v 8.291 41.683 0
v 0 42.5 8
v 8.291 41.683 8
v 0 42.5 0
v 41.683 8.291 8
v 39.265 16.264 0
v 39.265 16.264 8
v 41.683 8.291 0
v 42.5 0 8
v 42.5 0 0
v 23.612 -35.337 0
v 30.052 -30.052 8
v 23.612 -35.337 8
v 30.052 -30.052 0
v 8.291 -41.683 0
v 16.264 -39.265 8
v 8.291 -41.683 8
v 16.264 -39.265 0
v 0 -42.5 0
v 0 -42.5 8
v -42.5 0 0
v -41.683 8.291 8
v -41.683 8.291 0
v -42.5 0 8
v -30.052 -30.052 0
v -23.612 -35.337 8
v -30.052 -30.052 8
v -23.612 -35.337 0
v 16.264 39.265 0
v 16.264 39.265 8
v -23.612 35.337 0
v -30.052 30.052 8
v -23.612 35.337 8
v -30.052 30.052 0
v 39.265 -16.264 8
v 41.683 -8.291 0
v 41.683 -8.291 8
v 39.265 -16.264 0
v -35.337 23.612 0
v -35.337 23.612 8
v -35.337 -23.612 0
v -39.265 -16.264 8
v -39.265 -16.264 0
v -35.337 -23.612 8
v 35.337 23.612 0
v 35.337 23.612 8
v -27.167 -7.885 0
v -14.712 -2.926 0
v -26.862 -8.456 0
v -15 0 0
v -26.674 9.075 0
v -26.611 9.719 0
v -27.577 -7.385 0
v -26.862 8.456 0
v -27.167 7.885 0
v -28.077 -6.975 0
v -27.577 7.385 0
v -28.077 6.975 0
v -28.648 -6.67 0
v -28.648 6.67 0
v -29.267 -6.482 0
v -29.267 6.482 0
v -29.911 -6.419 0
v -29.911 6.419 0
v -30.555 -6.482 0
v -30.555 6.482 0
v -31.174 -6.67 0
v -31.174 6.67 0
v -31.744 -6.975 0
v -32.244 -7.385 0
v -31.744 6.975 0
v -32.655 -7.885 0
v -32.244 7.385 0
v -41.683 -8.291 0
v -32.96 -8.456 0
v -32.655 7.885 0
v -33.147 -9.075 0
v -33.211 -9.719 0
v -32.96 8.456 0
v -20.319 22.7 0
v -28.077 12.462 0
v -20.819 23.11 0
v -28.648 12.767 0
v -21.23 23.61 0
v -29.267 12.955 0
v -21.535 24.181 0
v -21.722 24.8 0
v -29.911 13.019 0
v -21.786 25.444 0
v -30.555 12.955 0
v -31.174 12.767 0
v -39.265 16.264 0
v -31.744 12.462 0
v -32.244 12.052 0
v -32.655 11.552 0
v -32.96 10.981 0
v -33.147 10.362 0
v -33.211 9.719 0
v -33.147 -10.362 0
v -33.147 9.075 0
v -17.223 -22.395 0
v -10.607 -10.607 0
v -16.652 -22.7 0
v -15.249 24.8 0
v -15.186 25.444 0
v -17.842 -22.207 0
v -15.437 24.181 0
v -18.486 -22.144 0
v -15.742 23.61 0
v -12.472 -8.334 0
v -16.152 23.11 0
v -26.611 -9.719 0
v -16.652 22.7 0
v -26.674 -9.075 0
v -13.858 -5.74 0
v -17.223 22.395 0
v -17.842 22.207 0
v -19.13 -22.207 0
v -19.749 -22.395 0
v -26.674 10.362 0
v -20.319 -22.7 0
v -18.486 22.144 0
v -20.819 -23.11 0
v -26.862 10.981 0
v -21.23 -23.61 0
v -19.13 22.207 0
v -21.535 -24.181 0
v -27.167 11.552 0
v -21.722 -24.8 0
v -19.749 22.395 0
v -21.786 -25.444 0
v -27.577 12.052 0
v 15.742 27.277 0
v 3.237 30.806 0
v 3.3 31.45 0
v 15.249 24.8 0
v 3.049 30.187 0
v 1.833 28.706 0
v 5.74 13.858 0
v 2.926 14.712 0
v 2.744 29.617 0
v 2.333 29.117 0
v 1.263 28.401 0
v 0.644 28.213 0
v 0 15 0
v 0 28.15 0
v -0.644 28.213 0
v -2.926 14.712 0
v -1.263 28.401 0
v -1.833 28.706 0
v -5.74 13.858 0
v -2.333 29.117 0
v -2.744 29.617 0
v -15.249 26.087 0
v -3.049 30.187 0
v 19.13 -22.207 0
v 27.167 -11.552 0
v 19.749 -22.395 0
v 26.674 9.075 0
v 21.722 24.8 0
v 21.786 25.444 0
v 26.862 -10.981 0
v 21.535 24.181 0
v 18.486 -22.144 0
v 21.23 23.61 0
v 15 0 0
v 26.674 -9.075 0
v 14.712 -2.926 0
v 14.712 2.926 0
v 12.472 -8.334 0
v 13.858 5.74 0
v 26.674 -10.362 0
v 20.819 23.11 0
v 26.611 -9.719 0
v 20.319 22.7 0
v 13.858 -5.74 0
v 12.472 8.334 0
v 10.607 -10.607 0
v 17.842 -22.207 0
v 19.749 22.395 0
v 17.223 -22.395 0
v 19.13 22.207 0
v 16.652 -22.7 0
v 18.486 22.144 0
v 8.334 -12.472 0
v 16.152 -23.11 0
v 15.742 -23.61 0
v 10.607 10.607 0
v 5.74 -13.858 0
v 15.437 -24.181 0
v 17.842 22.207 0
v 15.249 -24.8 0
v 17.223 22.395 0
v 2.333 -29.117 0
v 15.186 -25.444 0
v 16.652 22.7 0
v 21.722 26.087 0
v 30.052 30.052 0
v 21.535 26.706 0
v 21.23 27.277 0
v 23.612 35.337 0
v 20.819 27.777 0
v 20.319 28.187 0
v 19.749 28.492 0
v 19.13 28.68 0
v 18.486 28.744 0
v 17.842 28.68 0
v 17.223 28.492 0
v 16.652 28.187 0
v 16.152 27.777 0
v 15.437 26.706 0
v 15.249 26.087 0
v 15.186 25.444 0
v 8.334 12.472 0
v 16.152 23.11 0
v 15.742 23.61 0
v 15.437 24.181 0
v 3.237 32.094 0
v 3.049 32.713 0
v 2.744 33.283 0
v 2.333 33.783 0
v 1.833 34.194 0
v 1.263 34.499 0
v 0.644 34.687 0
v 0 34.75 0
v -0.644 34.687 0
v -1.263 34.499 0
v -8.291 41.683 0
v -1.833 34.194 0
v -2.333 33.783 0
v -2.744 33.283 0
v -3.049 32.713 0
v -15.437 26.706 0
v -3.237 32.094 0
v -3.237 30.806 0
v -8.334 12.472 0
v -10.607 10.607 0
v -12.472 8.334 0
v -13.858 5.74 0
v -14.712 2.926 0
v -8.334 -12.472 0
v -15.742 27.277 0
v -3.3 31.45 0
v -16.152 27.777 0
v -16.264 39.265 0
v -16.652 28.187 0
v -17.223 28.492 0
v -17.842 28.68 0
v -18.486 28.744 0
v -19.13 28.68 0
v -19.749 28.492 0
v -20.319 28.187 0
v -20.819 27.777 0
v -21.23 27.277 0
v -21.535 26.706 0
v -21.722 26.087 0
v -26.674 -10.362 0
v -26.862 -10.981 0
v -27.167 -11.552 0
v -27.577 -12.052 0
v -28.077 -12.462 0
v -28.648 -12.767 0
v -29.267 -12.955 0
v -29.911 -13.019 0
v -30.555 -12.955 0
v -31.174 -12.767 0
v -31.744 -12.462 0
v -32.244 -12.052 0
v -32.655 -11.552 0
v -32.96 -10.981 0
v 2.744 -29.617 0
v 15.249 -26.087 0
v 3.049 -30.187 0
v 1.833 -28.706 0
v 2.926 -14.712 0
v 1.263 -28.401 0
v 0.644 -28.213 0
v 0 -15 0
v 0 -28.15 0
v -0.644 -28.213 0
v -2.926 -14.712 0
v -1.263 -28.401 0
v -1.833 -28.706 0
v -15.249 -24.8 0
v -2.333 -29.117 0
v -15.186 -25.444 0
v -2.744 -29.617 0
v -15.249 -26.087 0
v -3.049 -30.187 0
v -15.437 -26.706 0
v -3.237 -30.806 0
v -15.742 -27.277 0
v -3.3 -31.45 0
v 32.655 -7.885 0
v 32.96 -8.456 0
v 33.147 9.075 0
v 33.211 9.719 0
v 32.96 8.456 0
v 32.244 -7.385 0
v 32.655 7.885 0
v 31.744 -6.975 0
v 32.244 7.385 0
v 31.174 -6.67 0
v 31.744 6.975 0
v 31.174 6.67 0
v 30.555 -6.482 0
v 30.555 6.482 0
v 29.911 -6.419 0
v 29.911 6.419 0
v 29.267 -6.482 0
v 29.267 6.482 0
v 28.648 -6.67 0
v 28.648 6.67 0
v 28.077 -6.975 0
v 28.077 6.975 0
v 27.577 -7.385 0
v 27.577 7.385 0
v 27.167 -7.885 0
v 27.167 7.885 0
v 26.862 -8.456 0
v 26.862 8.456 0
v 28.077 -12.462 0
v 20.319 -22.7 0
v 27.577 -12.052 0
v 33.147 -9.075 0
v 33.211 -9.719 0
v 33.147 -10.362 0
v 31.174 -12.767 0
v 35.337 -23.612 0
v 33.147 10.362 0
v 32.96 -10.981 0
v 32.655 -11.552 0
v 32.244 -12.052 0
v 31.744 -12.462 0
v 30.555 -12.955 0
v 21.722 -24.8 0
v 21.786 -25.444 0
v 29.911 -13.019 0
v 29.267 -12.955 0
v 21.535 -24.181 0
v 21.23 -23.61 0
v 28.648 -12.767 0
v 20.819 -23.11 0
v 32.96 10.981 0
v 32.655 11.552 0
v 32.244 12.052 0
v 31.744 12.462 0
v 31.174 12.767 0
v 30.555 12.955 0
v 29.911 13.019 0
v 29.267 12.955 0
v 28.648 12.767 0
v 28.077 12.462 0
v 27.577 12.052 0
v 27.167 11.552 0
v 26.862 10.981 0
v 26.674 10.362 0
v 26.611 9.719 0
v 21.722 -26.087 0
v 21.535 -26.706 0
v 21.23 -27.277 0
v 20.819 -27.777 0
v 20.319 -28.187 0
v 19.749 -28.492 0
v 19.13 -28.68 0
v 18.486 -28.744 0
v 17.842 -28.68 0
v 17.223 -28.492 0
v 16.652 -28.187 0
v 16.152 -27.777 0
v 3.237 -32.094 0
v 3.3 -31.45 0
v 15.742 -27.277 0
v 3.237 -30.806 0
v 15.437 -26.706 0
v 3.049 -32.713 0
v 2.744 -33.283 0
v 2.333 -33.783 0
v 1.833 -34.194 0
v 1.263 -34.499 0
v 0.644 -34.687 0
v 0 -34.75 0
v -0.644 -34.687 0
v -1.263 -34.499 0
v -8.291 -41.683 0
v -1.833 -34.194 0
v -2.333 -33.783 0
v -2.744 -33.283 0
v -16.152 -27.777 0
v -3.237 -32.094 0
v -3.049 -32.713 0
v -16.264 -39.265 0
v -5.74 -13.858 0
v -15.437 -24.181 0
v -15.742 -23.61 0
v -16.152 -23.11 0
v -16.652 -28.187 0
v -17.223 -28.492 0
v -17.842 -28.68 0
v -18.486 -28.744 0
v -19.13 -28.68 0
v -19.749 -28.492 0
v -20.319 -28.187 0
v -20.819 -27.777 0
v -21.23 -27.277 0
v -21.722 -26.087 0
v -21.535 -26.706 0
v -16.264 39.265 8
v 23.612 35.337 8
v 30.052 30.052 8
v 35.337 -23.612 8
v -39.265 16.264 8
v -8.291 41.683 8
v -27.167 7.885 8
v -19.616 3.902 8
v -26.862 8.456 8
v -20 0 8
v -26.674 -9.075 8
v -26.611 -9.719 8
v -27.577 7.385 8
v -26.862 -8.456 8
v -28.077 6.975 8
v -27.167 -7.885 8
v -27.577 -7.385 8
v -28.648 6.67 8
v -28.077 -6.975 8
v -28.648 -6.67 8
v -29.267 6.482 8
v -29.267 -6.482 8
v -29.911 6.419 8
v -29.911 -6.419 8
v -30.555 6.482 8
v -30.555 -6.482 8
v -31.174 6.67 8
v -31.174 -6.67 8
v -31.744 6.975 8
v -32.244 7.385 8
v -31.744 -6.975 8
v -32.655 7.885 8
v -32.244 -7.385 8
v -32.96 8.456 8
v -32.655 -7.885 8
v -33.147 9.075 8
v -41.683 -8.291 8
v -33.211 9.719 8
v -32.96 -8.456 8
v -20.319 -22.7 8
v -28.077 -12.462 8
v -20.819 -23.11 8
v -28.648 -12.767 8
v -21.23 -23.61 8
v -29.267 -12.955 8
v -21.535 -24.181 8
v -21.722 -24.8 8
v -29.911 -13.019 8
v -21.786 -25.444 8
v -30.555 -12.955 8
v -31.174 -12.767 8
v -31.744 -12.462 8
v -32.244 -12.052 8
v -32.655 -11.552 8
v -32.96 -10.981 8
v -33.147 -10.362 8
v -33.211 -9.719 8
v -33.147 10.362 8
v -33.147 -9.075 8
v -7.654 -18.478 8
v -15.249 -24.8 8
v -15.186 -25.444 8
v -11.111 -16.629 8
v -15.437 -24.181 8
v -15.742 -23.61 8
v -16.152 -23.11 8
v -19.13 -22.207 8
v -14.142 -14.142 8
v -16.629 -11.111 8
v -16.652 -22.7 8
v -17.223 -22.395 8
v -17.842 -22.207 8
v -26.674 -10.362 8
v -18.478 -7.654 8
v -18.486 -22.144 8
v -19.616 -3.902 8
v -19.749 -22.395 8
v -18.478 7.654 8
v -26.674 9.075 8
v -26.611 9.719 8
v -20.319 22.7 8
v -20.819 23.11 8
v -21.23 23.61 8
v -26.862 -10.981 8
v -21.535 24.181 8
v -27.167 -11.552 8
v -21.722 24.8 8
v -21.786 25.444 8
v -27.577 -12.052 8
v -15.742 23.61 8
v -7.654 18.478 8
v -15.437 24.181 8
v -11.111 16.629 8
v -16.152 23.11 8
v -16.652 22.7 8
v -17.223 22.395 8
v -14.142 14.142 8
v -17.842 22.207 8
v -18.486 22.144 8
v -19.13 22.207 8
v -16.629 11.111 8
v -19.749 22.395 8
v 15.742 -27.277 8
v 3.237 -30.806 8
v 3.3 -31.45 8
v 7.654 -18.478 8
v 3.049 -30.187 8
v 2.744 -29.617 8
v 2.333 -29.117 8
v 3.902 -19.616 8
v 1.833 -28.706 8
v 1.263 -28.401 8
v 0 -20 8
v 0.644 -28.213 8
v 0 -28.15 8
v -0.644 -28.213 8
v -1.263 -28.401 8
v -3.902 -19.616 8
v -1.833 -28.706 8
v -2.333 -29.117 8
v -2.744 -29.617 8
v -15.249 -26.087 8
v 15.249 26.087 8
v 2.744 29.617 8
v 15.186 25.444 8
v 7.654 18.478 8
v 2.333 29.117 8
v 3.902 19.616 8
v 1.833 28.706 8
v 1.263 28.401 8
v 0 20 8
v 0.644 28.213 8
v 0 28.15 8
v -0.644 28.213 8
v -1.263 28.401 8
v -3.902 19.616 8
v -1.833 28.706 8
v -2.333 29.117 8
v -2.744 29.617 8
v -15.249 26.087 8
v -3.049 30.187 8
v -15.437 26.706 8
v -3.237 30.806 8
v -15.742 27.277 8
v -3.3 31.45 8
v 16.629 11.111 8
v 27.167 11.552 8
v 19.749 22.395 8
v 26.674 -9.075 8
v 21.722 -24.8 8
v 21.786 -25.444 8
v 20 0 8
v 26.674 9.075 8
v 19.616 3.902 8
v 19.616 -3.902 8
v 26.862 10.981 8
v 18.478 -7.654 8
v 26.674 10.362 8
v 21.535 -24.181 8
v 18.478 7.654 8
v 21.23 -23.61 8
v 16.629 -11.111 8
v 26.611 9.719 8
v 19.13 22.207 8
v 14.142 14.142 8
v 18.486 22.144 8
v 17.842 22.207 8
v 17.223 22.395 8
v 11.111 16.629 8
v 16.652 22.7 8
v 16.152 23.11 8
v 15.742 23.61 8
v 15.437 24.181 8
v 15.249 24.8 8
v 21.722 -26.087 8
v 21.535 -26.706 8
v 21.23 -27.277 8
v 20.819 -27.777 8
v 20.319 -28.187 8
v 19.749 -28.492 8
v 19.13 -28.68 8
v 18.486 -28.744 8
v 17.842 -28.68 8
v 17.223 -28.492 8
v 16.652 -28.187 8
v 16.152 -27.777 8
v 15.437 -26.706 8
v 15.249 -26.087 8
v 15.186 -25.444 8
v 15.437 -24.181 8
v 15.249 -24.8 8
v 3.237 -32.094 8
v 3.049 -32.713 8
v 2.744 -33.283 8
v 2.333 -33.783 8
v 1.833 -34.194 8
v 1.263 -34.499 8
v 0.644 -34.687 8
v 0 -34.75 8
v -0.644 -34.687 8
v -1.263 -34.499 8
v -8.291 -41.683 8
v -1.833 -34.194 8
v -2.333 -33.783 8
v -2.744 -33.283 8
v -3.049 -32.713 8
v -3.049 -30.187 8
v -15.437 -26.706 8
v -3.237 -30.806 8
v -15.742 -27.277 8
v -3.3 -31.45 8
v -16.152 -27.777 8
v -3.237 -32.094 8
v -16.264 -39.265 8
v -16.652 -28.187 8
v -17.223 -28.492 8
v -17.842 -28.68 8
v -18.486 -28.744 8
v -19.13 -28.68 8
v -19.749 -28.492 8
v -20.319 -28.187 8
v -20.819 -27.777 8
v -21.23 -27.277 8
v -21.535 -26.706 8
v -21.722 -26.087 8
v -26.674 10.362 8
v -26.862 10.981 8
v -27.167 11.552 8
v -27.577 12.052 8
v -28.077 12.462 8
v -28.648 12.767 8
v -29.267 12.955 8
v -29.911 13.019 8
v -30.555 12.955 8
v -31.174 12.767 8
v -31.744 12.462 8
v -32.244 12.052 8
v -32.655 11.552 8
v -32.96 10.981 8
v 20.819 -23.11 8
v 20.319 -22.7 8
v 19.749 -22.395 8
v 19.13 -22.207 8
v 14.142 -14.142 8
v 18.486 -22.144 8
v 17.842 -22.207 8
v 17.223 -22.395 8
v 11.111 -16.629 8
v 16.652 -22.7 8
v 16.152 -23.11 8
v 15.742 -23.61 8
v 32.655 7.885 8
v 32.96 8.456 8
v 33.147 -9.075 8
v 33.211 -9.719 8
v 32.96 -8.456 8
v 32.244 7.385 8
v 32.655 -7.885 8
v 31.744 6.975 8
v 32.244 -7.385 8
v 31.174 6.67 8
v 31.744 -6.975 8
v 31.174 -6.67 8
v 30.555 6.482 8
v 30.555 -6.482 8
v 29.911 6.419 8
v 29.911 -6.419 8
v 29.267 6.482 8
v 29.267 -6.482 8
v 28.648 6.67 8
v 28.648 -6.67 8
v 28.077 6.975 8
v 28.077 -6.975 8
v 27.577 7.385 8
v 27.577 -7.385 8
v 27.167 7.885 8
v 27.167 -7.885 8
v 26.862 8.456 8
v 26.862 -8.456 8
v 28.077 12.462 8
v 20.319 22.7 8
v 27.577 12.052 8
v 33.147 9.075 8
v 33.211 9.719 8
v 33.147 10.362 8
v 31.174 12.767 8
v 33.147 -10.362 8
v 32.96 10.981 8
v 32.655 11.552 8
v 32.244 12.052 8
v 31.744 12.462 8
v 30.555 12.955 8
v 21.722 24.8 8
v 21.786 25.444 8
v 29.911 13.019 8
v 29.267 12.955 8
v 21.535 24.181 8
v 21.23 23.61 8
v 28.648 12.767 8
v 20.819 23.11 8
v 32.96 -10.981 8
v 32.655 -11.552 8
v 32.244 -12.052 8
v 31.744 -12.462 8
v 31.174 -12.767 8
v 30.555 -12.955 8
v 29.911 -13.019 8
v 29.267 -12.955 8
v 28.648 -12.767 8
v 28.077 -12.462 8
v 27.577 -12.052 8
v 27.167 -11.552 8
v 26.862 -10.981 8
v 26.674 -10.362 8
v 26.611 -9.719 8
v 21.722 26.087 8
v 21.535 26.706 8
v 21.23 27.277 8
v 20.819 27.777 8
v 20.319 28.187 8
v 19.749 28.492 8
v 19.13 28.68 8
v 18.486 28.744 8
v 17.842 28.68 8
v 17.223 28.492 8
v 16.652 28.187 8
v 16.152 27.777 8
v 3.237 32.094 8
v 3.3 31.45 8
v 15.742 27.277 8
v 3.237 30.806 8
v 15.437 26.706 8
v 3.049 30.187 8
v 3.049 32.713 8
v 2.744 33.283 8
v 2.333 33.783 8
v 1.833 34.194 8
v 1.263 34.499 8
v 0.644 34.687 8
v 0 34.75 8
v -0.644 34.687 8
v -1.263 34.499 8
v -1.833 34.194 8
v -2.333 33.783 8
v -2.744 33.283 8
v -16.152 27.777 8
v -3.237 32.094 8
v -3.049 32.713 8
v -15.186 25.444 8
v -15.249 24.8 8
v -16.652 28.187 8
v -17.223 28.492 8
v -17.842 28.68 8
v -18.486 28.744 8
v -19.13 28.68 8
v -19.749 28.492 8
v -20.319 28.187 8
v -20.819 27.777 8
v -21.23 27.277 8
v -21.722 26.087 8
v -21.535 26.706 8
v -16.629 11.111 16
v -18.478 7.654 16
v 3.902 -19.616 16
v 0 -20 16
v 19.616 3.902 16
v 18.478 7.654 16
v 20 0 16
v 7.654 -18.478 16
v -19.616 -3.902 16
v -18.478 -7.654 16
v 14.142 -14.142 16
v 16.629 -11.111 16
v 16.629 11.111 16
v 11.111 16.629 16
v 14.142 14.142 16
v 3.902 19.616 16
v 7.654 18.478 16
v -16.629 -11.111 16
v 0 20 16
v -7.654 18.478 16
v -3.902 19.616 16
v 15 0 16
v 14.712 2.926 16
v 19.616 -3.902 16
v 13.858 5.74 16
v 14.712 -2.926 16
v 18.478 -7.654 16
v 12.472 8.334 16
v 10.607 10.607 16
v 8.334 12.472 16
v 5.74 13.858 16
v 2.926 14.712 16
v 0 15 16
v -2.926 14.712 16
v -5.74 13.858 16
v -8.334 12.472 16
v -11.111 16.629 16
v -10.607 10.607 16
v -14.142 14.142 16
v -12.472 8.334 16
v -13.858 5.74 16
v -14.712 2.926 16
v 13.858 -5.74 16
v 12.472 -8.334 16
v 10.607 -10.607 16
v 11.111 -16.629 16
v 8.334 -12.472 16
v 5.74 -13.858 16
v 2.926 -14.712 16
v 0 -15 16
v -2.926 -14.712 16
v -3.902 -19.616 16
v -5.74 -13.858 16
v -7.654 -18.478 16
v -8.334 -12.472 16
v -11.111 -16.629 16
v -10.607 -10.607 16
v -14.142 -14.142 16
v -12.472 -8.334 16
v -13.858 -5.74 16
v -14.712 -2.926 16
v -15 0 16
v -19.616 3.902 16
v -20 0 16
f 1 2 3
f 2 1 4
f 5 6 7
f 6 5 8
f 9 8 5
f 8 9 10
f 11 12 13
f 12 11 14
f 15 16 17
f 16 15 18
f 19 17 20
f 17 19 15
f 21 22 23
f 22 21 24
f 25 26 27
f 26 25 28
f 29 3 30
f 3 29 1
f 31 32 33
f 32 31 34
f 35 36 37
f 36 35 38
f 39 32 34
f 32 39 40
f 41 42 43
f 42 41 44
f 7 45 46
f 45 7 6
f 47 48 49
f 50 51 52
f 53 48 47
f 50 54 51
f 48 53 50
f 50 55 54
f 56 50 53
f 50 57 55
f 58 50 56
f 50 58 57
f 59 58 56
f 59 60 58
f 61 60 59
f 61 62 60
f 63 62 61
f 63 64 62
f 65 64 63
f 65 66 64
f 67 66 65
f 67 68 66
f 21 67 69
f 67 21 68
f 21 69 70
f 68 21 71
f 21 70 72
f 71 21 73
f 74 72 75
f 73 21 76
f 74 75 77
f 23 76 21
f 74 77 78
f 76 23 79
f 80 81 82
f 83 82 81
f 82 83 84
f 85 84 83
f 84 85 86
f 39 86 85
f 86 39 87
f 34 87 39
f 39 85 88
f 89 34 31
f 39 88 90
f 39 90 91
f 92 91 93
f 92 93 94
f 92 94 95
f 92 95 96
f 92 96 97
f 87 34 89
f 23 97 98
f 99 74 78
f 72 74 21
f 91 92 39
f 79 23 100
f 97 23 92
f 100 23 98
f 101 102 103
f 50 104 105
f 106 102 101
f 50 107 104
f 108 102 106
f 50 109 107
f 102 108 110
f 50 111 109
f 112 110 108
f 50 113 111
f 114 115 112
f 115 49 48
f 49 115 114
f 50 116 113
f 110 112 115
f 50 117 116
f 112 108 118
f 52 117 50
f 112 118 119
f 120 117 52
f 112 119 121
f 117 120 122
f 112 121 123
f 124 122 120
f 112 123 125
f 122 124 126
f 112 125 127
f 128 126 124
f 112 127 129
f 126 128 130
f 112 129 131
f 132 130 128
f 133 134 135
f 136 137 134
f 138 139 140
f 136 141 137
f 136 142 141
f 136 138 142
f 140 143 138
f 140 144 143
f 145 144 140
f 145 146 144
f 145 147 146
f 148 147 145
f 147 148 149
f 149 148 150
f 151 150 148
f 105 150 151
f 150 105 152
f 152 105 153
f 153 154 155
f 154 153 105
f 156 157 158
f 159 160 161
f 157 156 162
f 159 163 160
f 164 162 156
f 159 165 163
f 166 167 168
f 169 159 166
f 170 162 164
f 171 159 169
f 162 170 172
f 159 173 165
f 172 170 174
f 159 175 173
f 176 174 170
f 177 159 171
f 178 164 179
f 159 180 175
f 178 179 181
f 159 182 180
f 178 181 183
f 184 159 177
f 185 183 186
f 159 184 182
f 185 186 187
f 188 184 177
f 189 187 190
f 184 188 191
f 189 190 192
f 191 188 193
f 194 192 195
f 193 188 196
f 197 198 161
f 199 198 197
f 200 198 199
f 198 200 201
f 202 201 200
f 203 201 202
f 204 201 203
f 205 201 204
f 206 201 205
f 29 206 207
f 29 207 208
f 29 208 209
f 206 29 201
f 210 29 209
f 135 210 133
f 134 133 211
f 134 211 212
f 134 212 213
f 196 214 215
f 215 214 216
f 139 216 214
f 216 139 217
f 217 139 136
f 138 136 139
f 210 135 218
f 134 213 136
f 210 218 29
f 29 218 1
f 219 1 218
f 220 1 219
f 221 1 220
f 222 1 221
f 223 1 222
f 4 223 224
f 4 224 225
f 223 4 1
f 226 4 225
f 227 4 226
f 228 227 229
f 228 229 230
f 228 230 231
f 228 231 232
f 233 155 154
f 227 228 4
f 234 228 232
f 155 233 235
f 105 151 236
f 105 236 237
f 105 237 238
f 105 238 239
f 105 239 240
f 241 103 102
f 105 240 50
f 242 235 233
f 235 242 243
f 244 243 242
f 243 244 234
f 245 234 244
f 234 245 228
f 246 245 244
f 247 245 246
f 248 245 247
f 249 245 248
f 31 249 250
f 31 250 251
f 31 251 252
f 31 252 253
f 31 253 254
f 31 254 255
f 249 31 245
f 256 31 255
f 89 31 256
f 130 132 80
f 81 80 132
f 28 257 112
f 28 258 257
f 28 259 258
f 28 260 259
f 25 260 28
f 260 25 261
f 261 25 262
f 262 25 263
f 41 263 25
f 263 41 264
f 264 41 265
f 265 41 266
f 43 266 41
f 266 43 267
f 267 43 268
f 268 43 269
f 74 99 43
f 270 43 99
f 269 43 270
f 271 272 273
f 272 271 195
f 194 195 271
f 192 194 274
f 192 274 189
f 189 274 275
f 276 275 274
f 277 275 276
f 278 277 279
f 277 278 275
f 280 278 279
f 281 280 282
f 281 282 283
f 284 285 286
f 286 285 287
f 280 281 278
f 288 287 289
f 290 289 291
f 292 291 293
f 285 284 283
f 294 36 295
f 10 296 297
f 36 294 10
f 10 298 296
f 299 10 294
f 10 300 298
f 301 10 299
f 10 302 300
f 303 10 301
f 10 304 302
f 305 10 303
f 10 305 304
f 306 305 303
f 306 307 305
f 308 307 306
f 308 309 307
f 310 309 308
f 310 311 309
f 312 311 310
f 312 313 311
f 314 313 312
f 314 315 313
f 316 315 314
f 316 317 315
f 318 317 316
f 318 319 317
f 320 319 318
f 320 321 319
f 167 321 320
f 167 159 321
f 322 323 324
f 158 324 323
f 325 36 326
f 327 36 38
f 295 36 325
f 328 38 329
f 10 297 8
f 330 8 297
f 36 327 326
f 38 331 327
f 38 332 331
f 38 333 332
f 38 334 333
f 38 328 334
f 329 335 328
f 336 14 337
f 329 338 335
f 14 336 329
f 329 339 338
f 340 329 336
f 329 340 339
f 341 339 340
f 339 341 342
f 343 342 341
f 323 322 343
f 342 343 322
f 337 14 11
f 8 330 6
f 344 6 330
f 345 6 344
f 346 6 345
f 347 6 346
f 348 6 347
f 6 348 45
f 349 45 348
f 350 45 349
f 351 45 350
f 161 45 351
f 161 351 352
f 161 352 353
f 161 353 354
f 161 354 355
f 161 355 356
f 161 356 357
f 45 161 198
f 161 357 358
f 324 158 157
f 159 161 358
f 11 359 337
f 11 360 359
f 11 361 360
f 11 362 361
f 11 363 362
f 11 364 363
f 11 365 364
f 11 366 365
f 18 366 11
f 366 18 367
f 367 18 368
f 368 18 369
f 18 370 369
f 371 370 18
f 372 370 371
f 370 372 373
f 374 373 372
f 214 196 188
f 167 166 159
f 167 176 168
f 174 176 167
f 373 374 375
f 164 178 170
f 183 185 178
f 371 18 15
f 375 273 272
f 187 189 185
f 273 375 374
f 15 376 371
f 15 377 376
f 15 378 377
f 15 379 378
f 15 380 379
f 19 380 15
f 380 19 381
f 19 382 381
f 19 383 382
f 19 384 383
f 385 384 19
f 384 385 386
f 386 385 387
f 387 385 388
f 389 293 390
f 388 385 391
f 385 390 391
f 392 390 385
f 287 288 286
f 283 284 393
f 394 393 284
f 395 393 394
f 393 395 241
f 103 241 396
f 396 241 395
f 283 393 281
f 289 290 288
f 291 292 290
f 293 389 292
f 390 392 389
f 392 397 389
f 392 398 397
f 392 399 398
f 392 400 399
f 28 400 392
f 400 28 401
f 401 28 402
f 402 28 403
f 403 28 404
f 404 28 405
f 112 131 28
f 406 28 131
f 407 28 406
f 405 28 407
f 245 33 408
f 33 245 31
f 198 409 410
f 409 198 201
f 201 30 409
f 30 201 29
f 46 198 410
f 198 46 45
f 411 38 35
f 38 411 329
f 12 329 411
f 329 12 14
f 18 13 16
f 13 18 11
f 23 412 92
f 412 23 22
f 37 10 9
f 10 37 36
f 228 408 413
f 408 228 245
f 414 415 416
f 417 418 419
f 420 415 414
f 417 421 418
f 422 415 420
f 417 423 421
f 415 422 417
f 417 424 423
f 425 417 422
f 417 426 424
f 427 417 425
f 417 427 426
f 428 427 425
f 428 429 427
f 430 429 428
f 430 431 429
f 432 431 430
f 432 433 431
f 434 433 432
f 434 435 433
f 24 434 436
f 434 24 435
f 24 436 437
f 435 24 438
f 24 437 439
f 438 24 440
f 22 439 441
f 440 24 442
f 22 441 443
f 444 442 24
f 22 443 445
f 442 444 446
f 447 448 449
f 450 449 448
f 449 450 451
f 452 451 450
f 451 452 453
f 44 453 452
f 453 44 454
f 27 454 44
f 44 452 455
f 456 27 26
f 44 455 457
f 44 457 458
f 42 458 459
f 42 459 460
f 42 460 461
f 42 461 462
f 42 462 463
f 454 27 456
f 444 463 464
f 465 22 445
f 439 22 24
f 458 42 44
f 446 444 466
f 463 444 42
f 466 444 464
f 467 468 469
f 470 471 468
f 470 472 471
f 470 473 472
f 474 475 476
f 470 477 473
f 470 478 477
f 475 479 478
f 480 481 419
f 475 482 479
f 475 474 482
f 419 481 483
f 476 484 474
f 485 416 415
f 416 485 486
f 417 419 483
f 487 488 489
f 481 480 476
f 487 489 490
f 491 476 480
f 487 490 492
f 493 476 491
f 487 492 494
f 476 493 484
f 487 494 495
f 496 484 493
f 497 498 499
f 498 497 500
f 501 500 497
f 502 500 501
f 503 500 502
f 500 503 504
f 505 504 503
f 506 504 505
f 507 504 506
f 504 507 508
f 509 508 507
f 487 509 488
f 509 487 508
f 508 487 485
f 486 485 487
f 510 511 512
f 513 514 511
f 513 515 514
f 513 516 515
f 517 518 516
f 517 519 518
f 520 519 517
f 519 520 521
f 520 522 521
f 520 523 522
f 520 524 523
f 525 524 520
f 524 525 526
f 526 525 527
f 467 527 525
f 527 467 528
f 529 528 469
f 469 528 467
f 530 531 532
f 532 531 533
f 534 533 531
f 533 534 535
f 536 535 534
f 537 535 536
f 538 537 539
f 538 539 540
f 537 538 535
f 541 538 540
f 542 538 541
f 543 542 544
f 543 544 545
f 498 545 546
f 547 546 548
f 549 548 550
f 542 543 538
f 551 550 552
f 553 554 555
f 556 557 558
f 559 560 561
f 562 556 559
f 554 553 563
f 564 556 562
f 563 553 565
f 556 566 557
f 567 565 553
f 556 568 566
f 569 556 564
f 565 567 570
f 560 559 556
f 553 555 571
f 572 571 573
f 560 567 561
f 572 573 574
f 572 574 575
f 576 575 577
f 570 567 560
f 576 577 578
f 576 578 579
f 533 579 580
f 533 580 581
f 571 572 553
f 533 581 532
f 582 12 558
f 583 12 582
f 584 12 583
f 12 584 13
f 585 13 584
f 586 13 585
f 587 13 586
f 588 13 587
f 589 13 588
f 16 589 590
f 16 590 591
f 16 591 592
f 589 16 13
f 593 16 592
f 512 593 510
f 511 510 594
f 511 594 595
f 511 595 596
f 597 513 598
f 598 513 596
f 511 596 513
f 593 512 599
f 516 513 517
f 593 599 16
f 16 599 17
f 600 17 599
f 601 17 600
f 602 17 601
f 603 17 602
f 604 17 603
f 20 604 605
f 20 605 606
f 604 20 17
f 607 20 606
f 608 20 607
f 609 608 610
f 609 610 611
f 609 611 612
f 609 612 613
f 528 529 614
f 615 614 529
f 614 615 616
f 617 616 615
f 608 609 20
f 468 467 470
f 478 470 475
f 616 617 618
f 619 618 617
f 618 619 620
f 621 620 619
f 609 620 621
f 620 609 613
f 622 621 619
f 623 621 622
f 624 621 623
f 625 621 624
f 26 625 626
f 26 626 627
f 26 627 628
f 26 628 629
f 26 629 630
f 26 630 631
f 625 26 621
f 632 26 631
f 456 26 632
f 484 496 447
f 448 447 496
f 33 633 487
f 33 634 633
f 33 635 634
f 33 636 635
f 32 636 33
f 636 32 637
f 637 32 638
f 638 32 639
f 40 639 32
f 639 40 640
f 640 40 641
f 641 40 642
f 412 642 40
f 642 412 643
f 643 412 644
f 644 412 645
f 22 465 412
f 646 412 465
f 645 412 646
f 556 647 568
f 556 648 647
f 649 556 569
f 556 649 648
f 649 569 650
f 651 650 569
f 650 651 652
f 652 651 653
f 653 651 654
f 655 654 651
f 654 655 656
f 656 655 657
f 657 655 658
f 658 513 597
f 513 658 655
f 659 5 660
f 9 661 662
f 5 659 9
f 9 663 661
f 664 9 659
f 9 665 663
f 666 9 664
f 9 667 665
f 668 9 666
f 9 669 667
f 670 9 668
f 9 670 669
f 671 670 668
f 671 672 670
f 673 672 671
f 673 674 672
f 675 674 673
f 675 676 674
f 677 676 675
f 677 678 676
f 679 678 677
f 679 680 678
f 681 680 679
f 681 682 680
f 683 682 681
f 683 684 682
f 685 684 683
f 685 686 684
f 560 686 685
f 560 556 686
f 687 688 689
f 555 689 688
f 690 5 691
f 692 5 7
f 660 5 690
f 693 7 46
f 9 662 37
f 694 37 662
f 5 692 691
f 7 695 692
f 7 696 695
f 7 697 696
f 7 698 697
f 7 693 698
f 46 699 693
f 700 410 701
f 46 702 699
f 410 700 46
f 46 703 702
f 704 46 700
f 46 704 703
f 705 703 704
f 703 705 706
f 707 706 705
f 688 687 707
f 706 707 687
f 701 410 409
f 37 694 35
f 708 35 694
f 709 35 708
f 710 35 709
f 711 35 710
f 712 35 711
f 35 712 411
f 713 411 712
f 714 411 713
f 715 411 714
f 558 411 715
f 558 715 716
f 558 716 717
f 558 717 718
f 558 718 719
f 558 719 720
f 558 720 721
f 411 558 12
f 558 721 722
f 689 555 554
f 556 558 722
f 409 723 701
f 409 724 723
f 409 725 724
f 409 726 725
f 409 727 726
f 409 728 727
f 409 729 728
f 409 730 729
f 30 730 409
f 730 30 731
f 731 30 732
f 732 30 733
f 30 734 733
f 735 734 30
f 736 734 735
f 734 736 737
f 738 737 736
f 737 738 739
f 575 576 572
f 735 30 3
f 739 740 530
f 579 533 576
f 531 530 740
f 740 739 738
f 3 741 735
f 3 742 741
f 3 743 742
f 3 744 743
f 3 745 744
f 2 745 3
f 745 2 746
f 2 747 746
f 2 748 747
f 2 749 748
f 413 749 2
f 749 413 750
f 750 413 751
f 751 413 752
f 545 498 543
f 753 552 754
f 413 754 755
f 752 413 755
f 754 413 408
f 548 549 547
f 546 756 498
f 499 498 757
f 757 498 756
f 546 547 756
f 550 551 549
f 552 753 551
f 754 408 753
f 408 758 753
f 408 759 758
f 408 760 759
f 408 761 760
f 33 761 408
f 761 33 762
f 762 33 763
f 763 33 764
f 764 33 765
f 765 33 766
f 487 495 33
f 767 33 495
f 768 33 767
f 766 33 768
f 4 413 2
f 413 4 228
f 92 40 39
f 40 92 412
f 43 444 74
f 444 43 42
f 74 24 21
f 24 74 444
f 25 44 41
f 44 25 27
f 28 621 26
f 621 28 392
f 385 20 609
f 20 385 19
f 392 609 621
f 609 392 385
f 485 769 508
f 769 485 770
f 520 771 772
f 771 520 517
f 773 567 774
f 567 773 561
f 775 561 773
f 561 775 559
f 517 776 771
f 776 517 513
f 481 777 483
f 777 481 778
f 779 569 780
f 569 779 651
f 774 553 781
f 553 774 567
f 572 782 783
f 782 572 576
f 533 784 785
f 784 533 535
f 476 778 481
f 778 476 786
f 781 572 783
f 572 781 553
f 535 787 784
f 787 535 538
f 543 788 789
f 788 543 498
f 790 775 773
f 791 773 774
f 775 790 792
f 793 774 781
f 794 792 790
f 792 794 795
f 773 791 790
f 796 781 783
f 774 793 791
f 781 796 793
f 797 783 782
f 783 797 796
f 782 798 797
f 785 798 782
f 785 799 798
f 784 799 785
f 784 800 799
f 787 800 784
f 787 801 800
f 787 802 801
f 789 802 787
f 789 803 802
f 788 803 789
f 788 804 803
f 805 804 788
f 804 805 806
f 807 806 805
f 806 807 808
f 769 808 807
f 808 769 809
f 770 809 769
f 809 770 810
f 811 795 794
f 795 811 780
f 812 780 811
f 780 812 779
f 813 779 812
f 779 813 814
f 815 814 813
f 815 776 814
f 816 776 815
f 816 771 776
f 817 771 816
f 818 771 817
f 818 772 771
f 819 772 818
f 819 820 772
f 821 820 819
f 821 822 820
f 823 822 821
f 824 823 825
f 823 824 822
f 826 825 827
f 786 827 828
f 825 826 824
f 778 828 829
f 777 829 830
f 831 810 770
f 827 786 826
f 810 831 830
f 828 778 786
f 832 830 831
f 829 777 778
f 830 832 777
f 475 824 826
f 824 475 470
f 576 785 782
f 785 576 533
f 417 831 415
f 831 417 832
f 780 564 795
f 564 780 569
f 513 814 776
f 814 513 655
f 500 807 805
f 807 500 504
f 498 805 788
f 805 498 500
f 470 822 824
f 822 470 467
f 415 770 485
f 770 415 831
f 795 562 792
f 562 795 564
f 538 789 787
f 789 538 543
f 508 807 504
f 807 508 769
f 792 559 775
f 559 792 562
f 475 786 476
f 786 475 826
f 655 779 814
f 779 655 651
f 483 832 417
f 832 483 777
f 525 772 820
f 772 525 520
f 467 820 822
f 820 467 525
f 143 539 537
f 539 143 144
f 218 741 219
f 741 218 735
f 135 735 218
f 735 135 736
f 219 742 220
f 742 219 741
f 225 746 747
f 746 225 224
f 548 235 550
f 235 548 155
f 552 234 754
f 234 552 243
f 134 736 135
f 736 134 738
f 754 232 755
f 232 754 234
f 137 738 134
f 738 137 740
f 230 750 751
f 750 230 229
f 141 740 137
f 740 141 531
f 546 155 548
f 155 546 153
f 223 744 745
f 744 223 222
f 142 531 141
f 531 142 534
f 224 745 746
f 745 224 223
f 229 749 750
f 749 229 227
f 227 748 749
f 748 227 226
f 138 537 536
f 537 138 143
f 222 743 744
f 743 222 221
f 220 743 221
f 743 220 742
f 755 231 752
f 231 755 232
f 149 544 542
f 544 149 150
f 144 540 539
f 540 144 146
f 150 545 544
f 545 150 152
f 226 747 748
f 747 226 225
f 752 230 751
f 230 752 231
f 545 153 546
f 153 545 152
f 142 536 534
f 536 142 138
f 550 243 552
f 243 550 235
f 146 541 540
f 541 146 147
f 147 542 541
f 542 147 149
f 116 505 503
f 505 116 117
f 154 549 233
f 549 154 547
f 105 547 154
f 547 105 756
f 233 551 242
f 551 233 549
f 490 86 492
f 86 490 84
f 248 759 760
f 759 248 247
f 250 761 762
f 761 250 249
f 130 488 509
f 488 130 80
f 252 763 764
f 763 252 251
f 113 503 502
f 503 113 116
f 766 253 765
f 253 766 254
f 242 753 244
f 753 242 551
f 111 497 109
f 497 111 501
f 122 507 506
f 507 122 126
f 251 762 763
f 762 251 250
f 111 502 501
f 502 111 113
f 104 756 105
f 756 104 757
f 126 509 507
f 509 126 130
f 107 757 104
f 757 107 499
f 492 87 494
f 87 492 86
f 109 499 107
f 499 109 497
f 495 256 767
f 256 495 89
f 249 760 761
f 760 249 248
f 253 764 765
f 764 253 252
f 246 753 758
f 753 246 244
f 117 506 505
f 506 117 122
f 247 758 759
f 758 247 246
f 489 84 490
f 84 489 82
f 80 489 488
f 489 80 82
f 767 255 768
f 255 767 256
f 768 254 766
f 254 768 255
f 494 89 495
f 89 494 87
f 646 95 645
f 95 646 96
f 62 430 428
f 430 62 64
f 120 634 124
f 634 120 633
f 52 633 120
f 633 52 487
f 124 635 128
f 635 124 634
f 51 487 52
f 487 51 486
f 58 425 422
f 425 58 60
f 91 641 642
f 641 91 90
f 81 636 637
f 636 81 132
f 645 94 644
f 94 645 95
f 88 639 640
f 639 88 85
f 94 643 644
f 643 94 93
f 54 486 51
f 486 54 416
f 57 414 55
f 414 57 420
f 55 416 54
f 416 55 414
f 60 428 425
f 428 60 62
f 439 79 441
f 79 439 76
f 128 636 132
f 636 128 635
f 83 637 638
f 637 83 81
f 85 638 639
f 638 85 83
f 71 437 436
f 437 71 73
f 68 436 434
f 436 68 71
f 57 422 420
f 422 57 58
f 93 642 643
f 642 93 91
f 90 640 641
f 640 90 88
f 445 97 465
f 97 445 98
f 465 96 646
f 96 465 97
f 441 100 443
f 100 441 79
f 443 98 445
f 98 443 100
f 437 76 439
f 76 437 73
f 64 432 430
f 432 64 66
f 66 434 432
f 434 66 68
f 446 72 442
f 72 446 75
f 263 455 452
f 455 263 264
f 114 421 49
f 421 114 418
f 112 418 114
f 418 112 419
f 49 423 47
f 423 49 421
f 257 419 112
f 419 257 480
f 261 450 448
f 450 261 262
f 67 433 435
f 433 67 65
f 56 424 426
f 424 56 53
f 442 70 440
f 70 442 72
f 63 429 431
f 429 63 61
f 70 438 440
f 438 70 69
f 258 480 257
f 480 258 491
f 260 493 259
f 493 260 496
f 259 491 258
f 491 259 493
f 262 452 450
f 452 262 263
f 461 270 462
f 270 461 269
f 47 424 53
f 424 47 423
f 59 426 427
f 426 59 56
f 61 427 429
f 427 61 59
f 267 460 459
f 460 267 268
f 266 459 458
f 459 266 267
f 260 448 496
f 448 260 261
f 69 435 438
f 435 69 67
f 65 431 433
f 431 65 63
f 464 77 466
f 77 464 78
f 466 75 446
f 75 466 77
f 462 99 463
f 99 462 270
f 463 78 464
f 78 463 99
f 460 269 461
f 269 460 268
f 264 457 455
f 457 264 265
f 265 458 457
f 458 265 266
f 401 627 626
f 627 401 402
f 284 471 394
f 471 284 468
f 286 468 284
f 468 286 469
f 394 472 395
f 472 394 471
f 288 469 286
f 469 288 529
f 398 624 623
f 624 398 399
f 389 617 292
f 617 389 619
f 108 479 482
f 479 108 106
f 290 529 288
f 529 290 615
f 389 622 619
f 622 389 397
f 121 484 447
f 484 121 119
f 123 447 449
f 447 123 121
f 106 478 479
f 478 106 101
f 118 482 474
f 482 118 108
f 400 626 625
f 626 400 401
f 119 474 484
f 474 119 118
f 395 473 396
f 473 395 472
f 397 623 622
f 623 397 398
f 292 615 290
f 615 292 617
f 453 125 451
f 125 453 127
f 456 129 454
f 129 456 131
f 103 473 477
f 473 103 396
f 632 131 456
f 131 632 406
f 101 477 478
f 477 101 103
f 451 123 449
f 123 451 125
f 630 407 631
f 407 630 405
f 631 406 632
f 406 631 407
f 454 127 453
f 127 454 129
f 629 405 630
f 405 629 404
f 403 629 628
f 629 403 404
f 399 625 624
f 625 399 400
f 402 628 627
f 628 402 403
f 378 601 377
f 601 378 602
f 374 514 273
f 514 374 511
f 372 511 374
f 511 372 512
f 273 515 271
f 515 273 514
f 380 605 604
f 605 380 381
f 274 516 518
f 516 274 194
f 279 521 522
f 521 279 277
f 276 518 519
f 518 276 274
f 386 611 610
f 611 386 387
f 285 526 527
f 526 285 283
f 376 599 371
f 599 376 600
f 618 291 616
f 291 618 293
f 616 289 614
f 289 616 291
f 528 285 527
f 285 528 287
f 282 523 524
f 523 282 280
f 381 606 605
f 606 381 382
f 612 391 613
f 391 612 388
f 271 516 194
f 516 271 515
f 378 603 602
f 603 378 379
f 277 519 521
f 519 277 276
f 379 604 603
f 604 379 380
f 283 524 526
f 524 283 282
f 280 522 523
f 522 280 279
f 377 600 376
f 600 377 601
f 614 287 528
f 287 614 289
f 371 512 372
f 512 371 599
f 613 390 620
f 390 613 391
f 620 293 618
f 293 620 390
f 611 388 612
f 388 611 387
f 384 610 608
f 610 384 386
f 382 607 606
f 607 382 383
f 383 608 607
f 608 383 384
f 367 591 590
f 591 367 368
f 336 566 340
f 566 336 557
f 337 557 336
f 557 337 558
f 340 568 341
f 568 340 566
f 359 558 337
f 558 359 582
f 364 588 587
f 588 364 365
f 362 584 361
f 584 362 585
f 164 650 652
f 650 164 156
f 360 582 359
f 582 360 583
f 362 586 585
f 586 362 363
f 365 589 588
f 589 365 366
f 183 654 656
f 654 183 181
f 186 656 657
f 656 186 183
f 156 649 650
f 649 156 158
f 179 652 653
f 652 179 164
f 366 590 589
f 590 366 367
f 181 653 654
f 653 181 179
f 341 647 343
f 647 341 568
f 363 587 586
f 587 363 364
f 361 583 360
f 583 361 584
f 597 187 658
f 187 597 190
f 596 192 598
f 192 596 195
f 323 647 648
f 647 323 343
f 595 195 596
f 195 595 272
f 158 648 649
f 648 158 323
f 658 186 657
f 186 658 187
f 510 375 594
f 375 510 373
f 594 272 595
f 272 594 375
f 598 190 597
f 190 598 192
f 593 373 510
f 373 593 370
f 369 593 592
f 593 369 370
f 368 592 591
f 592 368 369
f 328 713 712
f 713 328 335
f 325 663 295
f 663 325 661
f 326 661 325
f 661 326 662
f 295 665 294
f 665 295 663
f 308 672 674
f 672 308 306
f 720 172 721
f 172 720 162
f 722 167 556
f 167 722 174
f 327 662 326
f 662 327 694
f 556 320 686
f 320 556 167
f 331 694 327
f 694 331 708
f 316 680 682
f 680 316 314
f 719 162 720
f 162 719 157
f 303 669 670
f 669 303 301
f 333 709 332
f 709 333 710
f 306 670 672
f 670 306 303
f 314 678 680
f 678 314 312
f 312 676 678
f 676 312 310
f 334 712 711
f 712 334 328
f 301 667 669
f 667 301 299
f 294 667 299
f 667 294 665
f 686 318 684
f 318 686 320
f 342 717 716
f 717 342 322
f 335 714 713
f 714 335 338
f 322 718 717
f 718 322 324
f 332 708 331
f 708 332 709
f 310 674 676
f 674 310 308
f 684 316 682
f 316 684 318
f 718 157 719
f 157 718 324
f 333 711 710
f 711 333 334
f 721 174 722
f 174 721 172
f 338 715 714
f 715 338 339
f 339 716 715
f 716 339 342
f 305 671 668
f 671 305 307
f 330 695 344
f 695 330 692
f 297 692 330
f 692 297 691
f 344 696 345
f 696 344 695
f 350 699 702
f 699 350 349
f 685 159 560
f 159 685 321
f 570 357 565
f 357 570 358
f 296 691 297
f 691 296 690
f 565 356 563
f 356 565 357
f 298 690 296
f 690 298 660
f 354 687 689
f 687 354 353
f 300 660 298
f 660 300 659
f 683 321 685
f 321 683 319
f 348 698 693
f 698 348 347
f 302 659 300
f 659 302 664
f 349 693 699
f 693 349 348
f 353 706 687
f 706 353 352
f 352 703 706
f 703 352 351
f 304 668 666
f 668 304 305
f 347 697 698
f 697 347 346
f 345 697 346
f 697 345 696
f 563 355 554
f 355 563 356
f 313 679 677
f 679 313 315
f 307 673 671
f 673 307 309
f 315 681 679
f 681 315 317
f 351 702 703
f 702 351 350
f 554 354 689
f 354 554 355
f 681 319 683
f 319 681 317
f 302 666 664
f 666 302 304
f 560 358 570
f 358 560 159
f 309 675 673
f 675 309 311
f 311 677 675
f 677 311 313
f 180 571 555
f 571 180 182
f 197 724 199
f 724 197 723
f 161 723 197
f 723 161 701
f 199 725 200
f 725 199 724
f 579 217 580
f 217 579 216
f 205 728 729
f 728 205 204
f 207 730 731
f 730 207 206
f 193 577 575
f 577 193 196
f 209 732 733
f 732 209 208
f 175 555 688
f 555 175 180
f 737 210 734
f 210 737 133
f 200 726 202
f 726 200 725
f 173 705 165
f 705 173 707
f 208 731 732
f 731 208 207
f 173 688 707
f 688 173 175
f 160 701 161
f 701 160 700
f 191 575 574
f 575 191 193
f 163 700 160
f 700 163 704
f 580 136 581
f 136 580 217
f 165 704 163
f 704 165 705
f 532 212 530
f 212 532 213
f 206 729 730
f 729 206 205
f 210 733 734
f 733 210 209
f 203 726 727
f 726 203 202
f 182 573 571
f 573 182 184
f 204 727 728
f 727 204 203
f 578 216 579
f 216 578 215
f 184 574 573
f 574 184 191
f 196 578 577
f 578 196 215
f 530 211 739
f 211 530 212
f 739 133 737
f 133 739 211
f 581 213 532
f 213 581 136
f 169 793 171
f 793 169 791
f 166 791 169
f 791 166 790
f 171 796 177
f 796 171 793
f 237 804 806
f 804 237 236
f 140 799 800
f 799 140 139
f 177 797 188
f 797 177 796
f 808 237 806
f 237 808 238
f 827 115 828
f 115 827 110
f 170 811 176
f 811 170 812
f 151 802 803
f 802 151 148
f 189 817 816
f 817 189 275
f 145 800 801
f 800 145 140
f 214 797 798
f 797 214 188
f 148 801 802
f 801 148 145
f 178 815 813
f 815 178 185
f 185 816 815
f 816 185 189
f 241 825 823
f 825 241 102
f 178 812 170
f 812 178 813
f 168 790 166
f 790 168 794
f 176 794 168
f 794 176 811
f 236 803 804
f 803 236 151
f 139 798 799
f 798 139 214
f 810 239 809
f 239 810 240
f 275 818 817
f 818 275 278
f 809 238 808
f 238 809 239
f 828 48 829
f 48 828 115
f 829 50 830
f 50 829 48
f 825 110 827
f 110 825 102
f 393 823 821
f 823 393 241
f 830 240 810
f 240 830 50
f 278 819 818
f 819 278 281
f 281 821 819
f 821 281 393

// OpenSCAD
$fn = 32;

// ----------------------------------------------------------------------
// Flange Ø85 x 8
// 10 holes on a Ø62.9 bolt circle, bolted joints
// ----------------------------------------------------------------------

// --- parameters (mm) ---
flange_d = 85;    // outside diameter of the flange
seat_tol = 0.15;  // tolerance at the seating features
free_tol = 0.5;   // general tolerance on the free sizes
thickness = 8;    // flange thickness
holes = 10;       // number of bolt holes
pcd = 62.9;       // bolt circle diameter
start_deg = 90;   // angle of the first hole, from +X
hole_d = 6.6;     // bolt hole diameter
bore_d = 30;      // central through bore
hub_d = 40;       // hub outside diameter
hub_h = 8;        // hub height above the flange face (0 = no hub)

// --- derived feature positions (mm) ---
height = thickness + hub_h;  // = 16   overall height of the part
pcd_r = pcd / 2;             // = 31.45   bolt circle radius
hole_step = 360 / holes;     // = 36   angular pitch
feature_centers = [
  [pcd_r * cos(start_deg + 0 * hole_step), pcd_r * sin(start_deg + 0 * hole_step)],
  [pcd_r * cos(start_deg + 1 * hole_step), pcd_r * sin(start_deg + 1 * hole_step)],
  [pcd_r * cos(start_deg + 2 * hole_step), pcd_r * sin(start_deg + 2 * hole_step)],
  [pcd_r * cos(start_deg + 3 * hole_step), pcd_r * sin(start_deg + 3 * hole_step)],
  [pcd_r * cos(start_deg + 4 * hole_step), pcd_r * sin(start_deg + 4 * hole_step)],
  [pcd_r * cos(start_deg + 5 * hole_step), pcd_r * sin(start_deg + 5 * hole_step)],
  [pcd_r * cos(start_deg + 6 * hole_step), pcd_r * sin(start_deg + 6 * hole_step)],
  [pcd_r * cos(start_deg + 7 * hole_step), pcd_r * sin(start_deg + 7 * hole_step)],
  [pcd_r * cos(start_deg + 8 * hole_step), pcd_r * sin(start_deg + 8 * hole_step)],
  [pcd_r * cos(start_deg + 9 * hole_step), pcd_r * sin(start_deg + 9 * hole_step)]
];   // bolt hole centres on the pitch circle

// flange disc, every hole and the bore cut straight through
difference() {
  union() {
    cylinder(d = flange_d, h = thickness);
    cylinder(d = hub_d, h = height);  // hub, overlapped into the flange
  }
  translate([0, 0, -1]) cylinder(d = bore_d, h = height + 2);  // bore, through
  for (centre = feature_centers)
    translate([centre[0], centre[1], -1]) cylinder(d = hole_d, h = thickness + 2);
}
